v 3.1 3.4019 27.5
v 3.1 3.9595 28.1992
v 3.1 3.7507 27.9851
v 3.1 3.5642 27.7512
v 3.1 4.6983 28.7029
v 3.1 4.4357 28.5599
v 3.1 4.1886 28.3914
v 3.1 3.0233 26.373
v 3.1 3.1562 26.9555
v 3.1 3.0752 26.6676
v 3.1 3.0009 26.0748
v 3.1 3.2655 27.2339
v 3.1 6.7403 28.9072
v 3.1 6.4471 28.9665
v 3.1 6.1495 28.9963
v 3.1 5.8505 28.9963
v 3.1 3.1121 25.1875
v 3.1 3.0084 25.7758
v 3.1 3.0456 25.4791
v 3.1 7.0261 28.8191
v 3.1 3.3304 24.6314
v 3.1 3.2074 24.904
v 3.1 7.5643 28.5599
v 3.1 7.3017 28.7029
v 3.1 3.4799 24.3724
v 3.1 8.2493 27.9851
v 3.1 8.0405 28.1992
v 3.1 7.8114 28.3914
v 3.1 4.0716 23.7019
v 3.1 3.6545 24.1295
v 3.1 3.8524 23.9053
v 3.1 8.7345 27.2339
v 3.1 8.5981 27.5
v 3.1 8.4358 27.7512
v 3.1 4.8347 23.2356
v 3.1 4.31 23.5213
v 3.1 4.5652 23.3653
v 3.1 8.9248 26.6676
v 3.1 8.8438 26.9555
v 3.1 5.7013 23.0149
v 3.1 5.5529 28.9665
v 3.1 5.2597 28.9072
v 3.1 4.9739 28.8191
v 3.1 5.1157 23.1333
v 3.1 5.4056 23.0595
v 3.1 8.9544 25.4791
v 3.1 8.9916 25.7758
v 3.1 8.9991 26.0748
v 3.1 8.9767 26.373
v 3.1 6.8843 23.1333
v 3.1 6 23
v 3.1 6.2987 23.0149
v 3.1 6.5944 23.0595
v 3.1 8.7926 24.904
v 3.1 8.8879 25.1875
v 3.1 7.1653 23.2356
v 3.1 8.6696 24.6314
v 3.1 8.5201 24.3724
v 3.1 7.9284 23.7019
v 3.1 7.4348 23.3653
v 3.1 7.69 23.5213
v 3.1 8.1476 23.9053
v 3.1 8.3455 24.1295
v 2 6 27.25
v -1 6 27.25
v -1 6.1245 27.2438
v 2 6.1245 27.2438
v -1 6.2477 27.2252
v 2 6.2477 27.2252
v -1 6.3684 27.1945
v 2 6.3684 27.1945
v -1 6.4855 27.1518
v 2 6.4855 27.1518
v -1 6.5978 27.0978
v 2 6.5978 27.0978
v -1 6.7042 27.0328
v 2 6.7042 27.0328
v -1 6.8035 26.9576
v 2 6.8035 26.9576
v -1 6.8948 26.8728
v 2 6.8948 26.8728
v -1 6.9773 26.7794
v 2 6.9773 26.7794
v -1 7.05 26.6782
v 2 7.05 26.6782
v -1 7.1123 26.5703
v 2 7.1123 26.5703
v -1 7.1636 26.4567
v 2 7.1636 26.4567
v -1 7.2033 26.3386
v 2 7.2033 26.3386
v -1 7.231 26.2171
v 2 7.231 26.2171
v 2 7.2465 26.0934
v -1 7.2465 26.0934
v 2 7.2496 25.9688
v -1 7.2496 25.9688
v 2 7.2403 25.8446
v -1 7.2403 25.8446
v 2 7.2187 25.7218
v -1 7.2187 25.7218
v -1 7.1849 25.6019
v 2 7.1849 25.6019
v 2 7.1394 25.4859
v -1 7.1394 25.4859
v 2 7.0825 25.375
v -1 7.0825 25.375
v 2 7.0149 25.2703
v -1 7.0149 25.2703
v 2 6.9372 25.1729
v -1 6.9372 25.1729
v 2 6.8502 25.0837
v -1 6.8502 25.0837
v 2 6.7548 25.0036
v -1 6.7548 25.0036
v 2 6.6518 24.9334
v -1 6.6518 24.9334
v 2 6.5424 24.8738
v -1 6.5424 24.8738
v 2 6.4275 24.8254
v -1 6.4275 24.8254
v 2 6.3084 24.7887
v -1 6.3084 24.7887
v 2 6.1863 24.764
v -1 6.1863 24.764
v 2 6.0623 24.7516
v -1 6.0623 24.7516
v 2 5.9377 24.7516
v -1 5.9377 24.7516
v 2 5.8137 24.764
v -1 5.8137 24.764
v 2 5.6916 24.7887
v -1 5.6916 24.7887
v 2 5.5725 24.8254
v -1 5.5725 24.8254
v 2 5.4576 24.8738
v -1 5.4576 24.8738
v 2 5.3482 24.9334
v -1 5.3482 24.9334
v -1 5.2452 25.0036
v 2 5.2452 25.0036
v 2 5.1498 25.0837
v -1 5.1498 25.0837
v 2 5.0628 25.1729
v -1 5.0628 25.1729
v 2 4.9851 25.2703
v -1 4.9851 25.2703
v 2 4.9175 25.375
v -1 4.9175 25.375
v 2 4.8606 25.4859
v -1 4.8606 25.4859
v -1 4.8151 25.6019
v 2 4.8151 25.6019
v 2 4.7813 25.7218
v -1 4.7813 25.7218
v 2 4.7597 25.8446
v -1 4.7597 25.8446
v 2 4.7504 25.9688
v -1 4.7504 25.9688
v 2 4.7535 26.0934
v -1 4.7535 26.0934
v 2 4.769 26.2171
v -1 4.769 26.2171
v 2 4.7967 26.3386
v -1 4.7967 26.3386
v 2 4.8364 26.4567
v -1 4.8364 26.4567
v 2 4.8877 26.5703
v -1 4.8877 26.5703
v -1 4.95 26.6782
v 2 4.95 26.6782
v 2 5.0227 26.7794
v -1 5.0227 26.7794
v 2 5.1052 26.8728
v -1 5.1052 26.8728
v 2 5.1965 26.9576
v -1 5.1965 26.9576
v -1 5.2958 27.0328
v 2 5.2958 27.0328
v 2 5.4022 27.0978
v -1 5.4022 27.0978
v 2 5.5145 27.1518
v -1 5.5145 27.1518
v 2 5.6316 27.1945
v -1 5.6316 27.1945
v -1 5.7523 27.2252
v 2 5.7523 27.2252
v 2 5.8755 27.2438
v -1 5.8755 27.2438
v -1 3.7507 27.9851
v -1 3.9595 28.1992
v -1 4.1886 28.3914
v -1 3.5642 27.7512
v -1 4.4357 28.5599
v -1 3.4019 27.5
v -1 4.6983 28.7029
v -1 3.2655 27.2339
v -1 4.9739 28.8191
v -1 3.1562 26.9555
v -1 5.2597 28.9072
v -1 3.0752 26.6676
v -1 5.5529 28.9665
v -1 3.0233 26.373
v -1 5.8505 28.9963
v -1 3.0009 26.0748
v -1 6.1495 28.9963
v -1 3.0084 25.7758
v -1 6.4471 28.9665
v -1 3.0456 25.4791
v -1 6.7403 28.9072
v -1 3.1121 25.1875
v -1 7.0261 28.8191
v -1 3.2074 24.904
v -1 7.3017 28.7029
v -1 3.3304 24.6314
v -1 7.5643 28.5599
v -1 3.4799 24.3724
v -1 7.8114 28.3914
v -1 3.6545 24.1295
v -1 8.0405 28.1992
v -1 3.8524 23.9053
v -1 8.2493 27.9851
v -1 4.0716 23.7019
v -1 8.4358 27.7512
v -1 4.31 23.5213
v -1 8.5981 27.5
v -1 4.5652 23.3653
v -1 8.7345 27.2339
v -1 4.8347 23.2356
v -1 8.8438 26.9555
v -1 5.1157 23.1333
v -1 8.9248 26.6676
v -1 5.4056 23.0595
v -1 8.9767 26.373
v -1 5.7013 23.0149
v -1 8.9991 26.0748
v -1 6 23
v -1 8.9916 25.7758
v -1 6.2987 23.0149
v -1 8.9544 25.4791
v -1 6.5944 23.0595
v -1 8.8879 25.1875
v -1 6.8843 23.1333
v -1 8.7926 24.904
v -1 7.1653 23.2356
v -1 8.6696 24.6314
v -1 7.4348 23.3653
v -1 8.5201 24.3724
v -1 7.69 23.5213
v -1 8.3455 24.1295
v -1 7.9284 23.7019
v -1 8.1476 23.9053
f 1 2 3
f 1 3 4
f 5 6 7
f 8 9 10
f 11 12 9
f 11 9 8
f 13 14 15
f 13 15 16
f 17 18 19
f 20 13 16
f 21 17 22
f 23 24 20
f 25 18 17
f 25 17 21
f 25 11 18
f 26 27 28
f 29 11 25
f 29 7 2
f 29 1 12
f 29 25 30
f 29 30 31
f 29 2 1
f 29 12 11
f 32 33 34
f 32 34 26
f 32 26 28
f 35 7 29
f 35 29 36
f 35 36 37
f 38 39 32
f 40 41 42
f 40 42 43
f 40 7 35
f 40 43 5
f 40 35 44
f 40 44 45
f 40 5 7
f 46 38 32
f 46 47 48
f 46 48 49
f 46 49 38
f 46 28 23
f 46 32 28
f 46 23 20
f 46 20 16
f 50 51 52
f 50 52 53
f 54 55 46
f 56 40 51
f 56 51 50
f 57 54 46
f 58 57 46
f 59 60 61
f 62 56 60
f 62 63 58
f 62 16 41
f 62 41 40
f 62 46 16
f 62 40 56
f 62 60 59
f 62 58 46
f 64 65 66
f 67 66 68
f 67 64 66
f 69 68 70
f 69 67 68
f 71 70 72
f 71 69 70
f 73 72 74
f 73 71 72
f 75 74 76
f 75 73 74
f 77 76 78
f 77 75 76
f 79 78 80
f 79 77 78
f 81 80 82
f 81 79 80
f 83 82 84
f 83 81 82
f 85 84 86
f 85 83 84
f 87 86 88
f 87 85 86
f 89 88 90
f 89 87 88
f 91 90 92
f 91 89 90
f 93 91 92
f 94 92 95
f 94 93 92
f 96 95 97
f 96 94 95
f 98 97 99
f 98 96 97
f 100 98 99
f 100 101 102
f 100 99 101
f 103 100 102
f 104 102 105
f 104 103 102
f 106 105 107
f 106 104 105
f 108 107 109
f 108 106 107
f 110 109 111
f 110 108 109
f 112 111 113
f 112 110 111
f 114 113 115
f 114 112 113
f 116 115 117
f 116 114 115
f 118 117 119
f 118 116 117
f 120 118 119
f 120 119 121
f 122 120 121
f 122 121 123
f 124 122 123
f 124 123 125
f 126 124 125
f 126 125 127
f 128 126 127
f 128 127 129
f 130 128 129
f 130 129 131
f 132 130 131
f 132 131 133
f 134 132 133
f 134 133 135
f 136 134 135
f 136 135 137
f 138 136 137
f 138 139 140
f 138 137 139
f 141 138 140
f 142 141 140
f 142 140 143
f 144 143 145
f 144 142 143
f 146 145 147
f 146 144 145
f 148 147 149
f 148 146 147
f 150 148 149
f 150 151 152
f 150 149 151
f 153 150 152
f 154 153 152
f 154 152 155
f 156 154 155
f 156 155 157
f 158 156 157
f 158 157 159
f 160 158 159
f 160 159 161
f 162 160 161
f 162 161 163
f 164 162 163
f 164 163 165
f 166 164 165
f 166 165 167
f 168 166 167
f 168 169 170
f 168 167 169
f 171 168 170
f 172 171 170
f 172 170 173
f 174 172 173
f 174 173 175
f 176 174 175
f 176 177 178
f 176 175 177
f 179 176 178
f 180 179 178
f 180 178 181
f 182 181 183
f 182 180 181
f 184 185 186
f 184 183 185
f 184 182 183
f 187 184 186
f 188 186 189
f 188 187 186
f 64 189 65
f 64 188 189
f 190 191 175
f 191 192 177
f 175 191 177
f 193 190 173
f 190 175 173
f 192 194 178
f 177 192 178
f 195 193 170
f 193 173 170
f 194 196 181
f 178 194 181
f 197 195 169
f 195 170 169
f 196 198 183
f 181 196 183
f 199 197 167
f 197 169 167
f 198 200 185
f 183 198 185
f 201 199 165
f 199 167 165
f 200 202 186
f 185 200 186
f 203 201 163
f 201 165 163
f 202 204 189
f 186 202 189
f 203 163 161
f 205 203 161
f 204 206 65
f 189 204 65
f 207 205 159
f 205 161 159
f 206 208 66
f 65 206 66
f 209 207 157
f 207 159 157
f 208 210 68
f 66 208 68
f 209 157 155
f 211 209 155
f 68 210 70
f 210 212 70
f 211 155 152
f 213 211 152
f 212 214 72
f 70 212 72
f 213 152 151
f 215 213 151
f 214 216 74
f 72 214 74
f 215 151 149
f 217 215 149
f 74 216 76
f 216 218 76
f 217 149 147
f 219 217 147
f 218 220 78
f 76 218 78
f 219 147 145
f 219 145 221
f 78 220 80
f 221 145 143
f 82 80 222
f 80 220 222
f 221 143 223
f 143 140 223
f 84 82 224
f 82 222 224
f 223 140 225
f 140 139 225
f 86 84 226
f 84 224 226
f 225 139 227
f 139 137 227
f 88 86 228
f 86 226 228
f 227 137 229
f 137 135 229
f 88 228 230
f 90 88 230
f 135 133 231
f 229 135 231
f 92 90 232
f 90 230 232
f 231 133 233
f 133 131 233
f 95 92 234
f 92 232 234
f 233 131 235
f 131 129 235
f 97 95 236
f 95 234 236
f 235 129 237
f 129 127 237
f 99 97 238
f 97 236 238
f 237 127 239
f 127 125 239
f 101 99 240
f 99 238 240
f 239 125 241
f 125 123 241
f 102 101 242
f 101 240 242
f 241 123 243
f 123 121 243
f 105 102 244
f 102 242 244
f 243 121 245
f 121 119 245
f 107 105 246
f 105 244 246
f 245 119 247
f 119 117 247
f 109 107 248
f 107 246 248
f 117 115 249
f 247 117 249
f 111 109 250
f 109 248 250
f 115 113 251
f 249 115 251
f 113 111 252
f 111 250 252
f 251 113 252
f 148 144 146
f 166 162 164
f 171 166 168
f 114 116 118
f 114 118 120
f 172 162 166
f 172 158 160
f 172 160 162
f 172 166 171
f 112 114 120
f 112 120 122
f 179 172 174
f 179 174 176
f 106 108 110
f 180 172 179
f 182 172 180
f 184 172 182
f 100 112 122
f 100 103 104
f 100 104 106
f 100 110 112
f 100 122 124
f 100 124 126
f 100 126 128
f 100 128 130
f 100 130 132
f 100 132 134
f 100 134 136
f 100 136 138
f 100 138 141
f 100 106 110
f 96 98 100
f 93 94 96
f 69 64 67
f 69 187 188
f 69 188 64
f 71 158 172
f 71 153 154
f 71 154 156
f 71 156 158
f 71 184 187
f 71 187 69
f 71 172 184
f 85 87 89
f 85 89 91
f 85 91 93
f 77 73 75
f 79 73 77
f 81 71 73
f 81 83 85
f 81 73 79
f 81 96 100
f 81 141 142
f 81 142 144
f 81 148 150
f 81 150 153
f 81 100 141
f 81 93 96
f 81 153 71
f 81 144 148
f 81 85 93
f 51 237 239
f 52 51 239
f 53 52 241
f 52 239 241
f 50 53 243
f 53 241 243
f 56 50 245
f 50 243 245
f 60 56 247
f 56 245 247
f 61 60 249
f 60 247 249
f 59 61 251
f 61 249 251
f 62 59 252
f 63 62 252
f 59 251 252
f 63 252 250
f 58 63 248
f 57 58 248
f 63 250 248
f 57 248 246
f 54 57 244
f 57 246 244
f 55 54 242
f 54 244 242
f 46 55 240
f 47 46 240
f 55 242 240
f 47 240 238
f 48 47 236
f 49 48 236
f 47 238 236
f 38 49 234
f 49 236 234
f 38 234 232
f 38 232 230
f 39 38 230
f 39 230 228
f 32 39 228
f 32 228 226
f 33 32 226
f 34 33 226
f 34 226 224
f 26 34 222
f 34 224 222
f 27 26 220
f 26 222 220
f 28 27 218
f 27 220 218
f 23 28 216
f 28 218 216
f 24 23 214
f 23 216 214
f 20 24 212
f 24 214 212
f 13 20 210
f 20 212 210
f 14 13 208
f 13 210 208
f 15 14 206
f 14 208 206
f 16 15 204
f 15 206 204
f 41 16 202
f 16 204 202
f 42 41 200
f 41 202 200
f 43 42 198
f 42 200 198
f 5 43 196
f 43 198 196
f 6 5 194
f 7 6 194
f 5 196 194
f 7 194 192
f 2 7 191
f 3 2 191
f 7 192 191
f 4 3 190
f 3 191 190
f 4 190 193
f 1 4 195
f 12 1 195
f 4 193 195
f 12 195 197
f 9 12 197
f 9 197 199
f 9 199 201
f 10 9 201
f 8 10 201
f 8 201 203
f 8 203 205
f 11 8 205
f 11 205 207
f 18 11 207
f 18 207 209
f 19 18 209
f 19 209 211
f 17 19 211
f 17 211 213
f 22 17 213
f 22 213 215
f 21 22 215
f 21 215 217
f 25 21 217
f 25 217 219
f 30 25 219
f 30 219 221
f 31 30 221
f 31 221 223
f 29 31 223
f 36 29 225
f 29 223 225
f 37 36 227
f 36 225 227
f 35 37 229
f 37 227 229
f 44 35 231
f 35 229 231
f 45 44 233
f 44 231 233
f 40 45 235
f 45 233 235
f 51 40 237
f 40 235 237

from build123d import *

# Parameters (mm, degrees)
CYLINDER062_R     = 1.25
CYLINDER062_DEPTH = 5
CYLINDER038_R     = 3
CYLINDER038_DEPTH = 4.1


with BuildPart() as b_w009:
    # Cylinder062 → Cylinder062 (new body)
    with BuildSketch(Plane(origin=(2, 6, 26), x_dir=(0, 0, 1), z_dir=(-1, 0, 0))):
        Circle(CYLINDER062_R)
    extrude(amount=CYLINDER062_DEPTH)


with BuildPart() as cut023:
    # Cylinder038 → Cylinder038 (new body)
    with BuildSketch(Plane(origin=(-1, 6, 26), x_dir=(0, 0, -1), z_dir=(1, 0, 0))):
        Circle(CYLINDER038_R)
    extrude(amount=CYLINDER038_DEPTH)

    # Cut023: cut B_W009
    add(b_w009.part, mode=Mode.SUBTRACT)


solid = cut023.part
